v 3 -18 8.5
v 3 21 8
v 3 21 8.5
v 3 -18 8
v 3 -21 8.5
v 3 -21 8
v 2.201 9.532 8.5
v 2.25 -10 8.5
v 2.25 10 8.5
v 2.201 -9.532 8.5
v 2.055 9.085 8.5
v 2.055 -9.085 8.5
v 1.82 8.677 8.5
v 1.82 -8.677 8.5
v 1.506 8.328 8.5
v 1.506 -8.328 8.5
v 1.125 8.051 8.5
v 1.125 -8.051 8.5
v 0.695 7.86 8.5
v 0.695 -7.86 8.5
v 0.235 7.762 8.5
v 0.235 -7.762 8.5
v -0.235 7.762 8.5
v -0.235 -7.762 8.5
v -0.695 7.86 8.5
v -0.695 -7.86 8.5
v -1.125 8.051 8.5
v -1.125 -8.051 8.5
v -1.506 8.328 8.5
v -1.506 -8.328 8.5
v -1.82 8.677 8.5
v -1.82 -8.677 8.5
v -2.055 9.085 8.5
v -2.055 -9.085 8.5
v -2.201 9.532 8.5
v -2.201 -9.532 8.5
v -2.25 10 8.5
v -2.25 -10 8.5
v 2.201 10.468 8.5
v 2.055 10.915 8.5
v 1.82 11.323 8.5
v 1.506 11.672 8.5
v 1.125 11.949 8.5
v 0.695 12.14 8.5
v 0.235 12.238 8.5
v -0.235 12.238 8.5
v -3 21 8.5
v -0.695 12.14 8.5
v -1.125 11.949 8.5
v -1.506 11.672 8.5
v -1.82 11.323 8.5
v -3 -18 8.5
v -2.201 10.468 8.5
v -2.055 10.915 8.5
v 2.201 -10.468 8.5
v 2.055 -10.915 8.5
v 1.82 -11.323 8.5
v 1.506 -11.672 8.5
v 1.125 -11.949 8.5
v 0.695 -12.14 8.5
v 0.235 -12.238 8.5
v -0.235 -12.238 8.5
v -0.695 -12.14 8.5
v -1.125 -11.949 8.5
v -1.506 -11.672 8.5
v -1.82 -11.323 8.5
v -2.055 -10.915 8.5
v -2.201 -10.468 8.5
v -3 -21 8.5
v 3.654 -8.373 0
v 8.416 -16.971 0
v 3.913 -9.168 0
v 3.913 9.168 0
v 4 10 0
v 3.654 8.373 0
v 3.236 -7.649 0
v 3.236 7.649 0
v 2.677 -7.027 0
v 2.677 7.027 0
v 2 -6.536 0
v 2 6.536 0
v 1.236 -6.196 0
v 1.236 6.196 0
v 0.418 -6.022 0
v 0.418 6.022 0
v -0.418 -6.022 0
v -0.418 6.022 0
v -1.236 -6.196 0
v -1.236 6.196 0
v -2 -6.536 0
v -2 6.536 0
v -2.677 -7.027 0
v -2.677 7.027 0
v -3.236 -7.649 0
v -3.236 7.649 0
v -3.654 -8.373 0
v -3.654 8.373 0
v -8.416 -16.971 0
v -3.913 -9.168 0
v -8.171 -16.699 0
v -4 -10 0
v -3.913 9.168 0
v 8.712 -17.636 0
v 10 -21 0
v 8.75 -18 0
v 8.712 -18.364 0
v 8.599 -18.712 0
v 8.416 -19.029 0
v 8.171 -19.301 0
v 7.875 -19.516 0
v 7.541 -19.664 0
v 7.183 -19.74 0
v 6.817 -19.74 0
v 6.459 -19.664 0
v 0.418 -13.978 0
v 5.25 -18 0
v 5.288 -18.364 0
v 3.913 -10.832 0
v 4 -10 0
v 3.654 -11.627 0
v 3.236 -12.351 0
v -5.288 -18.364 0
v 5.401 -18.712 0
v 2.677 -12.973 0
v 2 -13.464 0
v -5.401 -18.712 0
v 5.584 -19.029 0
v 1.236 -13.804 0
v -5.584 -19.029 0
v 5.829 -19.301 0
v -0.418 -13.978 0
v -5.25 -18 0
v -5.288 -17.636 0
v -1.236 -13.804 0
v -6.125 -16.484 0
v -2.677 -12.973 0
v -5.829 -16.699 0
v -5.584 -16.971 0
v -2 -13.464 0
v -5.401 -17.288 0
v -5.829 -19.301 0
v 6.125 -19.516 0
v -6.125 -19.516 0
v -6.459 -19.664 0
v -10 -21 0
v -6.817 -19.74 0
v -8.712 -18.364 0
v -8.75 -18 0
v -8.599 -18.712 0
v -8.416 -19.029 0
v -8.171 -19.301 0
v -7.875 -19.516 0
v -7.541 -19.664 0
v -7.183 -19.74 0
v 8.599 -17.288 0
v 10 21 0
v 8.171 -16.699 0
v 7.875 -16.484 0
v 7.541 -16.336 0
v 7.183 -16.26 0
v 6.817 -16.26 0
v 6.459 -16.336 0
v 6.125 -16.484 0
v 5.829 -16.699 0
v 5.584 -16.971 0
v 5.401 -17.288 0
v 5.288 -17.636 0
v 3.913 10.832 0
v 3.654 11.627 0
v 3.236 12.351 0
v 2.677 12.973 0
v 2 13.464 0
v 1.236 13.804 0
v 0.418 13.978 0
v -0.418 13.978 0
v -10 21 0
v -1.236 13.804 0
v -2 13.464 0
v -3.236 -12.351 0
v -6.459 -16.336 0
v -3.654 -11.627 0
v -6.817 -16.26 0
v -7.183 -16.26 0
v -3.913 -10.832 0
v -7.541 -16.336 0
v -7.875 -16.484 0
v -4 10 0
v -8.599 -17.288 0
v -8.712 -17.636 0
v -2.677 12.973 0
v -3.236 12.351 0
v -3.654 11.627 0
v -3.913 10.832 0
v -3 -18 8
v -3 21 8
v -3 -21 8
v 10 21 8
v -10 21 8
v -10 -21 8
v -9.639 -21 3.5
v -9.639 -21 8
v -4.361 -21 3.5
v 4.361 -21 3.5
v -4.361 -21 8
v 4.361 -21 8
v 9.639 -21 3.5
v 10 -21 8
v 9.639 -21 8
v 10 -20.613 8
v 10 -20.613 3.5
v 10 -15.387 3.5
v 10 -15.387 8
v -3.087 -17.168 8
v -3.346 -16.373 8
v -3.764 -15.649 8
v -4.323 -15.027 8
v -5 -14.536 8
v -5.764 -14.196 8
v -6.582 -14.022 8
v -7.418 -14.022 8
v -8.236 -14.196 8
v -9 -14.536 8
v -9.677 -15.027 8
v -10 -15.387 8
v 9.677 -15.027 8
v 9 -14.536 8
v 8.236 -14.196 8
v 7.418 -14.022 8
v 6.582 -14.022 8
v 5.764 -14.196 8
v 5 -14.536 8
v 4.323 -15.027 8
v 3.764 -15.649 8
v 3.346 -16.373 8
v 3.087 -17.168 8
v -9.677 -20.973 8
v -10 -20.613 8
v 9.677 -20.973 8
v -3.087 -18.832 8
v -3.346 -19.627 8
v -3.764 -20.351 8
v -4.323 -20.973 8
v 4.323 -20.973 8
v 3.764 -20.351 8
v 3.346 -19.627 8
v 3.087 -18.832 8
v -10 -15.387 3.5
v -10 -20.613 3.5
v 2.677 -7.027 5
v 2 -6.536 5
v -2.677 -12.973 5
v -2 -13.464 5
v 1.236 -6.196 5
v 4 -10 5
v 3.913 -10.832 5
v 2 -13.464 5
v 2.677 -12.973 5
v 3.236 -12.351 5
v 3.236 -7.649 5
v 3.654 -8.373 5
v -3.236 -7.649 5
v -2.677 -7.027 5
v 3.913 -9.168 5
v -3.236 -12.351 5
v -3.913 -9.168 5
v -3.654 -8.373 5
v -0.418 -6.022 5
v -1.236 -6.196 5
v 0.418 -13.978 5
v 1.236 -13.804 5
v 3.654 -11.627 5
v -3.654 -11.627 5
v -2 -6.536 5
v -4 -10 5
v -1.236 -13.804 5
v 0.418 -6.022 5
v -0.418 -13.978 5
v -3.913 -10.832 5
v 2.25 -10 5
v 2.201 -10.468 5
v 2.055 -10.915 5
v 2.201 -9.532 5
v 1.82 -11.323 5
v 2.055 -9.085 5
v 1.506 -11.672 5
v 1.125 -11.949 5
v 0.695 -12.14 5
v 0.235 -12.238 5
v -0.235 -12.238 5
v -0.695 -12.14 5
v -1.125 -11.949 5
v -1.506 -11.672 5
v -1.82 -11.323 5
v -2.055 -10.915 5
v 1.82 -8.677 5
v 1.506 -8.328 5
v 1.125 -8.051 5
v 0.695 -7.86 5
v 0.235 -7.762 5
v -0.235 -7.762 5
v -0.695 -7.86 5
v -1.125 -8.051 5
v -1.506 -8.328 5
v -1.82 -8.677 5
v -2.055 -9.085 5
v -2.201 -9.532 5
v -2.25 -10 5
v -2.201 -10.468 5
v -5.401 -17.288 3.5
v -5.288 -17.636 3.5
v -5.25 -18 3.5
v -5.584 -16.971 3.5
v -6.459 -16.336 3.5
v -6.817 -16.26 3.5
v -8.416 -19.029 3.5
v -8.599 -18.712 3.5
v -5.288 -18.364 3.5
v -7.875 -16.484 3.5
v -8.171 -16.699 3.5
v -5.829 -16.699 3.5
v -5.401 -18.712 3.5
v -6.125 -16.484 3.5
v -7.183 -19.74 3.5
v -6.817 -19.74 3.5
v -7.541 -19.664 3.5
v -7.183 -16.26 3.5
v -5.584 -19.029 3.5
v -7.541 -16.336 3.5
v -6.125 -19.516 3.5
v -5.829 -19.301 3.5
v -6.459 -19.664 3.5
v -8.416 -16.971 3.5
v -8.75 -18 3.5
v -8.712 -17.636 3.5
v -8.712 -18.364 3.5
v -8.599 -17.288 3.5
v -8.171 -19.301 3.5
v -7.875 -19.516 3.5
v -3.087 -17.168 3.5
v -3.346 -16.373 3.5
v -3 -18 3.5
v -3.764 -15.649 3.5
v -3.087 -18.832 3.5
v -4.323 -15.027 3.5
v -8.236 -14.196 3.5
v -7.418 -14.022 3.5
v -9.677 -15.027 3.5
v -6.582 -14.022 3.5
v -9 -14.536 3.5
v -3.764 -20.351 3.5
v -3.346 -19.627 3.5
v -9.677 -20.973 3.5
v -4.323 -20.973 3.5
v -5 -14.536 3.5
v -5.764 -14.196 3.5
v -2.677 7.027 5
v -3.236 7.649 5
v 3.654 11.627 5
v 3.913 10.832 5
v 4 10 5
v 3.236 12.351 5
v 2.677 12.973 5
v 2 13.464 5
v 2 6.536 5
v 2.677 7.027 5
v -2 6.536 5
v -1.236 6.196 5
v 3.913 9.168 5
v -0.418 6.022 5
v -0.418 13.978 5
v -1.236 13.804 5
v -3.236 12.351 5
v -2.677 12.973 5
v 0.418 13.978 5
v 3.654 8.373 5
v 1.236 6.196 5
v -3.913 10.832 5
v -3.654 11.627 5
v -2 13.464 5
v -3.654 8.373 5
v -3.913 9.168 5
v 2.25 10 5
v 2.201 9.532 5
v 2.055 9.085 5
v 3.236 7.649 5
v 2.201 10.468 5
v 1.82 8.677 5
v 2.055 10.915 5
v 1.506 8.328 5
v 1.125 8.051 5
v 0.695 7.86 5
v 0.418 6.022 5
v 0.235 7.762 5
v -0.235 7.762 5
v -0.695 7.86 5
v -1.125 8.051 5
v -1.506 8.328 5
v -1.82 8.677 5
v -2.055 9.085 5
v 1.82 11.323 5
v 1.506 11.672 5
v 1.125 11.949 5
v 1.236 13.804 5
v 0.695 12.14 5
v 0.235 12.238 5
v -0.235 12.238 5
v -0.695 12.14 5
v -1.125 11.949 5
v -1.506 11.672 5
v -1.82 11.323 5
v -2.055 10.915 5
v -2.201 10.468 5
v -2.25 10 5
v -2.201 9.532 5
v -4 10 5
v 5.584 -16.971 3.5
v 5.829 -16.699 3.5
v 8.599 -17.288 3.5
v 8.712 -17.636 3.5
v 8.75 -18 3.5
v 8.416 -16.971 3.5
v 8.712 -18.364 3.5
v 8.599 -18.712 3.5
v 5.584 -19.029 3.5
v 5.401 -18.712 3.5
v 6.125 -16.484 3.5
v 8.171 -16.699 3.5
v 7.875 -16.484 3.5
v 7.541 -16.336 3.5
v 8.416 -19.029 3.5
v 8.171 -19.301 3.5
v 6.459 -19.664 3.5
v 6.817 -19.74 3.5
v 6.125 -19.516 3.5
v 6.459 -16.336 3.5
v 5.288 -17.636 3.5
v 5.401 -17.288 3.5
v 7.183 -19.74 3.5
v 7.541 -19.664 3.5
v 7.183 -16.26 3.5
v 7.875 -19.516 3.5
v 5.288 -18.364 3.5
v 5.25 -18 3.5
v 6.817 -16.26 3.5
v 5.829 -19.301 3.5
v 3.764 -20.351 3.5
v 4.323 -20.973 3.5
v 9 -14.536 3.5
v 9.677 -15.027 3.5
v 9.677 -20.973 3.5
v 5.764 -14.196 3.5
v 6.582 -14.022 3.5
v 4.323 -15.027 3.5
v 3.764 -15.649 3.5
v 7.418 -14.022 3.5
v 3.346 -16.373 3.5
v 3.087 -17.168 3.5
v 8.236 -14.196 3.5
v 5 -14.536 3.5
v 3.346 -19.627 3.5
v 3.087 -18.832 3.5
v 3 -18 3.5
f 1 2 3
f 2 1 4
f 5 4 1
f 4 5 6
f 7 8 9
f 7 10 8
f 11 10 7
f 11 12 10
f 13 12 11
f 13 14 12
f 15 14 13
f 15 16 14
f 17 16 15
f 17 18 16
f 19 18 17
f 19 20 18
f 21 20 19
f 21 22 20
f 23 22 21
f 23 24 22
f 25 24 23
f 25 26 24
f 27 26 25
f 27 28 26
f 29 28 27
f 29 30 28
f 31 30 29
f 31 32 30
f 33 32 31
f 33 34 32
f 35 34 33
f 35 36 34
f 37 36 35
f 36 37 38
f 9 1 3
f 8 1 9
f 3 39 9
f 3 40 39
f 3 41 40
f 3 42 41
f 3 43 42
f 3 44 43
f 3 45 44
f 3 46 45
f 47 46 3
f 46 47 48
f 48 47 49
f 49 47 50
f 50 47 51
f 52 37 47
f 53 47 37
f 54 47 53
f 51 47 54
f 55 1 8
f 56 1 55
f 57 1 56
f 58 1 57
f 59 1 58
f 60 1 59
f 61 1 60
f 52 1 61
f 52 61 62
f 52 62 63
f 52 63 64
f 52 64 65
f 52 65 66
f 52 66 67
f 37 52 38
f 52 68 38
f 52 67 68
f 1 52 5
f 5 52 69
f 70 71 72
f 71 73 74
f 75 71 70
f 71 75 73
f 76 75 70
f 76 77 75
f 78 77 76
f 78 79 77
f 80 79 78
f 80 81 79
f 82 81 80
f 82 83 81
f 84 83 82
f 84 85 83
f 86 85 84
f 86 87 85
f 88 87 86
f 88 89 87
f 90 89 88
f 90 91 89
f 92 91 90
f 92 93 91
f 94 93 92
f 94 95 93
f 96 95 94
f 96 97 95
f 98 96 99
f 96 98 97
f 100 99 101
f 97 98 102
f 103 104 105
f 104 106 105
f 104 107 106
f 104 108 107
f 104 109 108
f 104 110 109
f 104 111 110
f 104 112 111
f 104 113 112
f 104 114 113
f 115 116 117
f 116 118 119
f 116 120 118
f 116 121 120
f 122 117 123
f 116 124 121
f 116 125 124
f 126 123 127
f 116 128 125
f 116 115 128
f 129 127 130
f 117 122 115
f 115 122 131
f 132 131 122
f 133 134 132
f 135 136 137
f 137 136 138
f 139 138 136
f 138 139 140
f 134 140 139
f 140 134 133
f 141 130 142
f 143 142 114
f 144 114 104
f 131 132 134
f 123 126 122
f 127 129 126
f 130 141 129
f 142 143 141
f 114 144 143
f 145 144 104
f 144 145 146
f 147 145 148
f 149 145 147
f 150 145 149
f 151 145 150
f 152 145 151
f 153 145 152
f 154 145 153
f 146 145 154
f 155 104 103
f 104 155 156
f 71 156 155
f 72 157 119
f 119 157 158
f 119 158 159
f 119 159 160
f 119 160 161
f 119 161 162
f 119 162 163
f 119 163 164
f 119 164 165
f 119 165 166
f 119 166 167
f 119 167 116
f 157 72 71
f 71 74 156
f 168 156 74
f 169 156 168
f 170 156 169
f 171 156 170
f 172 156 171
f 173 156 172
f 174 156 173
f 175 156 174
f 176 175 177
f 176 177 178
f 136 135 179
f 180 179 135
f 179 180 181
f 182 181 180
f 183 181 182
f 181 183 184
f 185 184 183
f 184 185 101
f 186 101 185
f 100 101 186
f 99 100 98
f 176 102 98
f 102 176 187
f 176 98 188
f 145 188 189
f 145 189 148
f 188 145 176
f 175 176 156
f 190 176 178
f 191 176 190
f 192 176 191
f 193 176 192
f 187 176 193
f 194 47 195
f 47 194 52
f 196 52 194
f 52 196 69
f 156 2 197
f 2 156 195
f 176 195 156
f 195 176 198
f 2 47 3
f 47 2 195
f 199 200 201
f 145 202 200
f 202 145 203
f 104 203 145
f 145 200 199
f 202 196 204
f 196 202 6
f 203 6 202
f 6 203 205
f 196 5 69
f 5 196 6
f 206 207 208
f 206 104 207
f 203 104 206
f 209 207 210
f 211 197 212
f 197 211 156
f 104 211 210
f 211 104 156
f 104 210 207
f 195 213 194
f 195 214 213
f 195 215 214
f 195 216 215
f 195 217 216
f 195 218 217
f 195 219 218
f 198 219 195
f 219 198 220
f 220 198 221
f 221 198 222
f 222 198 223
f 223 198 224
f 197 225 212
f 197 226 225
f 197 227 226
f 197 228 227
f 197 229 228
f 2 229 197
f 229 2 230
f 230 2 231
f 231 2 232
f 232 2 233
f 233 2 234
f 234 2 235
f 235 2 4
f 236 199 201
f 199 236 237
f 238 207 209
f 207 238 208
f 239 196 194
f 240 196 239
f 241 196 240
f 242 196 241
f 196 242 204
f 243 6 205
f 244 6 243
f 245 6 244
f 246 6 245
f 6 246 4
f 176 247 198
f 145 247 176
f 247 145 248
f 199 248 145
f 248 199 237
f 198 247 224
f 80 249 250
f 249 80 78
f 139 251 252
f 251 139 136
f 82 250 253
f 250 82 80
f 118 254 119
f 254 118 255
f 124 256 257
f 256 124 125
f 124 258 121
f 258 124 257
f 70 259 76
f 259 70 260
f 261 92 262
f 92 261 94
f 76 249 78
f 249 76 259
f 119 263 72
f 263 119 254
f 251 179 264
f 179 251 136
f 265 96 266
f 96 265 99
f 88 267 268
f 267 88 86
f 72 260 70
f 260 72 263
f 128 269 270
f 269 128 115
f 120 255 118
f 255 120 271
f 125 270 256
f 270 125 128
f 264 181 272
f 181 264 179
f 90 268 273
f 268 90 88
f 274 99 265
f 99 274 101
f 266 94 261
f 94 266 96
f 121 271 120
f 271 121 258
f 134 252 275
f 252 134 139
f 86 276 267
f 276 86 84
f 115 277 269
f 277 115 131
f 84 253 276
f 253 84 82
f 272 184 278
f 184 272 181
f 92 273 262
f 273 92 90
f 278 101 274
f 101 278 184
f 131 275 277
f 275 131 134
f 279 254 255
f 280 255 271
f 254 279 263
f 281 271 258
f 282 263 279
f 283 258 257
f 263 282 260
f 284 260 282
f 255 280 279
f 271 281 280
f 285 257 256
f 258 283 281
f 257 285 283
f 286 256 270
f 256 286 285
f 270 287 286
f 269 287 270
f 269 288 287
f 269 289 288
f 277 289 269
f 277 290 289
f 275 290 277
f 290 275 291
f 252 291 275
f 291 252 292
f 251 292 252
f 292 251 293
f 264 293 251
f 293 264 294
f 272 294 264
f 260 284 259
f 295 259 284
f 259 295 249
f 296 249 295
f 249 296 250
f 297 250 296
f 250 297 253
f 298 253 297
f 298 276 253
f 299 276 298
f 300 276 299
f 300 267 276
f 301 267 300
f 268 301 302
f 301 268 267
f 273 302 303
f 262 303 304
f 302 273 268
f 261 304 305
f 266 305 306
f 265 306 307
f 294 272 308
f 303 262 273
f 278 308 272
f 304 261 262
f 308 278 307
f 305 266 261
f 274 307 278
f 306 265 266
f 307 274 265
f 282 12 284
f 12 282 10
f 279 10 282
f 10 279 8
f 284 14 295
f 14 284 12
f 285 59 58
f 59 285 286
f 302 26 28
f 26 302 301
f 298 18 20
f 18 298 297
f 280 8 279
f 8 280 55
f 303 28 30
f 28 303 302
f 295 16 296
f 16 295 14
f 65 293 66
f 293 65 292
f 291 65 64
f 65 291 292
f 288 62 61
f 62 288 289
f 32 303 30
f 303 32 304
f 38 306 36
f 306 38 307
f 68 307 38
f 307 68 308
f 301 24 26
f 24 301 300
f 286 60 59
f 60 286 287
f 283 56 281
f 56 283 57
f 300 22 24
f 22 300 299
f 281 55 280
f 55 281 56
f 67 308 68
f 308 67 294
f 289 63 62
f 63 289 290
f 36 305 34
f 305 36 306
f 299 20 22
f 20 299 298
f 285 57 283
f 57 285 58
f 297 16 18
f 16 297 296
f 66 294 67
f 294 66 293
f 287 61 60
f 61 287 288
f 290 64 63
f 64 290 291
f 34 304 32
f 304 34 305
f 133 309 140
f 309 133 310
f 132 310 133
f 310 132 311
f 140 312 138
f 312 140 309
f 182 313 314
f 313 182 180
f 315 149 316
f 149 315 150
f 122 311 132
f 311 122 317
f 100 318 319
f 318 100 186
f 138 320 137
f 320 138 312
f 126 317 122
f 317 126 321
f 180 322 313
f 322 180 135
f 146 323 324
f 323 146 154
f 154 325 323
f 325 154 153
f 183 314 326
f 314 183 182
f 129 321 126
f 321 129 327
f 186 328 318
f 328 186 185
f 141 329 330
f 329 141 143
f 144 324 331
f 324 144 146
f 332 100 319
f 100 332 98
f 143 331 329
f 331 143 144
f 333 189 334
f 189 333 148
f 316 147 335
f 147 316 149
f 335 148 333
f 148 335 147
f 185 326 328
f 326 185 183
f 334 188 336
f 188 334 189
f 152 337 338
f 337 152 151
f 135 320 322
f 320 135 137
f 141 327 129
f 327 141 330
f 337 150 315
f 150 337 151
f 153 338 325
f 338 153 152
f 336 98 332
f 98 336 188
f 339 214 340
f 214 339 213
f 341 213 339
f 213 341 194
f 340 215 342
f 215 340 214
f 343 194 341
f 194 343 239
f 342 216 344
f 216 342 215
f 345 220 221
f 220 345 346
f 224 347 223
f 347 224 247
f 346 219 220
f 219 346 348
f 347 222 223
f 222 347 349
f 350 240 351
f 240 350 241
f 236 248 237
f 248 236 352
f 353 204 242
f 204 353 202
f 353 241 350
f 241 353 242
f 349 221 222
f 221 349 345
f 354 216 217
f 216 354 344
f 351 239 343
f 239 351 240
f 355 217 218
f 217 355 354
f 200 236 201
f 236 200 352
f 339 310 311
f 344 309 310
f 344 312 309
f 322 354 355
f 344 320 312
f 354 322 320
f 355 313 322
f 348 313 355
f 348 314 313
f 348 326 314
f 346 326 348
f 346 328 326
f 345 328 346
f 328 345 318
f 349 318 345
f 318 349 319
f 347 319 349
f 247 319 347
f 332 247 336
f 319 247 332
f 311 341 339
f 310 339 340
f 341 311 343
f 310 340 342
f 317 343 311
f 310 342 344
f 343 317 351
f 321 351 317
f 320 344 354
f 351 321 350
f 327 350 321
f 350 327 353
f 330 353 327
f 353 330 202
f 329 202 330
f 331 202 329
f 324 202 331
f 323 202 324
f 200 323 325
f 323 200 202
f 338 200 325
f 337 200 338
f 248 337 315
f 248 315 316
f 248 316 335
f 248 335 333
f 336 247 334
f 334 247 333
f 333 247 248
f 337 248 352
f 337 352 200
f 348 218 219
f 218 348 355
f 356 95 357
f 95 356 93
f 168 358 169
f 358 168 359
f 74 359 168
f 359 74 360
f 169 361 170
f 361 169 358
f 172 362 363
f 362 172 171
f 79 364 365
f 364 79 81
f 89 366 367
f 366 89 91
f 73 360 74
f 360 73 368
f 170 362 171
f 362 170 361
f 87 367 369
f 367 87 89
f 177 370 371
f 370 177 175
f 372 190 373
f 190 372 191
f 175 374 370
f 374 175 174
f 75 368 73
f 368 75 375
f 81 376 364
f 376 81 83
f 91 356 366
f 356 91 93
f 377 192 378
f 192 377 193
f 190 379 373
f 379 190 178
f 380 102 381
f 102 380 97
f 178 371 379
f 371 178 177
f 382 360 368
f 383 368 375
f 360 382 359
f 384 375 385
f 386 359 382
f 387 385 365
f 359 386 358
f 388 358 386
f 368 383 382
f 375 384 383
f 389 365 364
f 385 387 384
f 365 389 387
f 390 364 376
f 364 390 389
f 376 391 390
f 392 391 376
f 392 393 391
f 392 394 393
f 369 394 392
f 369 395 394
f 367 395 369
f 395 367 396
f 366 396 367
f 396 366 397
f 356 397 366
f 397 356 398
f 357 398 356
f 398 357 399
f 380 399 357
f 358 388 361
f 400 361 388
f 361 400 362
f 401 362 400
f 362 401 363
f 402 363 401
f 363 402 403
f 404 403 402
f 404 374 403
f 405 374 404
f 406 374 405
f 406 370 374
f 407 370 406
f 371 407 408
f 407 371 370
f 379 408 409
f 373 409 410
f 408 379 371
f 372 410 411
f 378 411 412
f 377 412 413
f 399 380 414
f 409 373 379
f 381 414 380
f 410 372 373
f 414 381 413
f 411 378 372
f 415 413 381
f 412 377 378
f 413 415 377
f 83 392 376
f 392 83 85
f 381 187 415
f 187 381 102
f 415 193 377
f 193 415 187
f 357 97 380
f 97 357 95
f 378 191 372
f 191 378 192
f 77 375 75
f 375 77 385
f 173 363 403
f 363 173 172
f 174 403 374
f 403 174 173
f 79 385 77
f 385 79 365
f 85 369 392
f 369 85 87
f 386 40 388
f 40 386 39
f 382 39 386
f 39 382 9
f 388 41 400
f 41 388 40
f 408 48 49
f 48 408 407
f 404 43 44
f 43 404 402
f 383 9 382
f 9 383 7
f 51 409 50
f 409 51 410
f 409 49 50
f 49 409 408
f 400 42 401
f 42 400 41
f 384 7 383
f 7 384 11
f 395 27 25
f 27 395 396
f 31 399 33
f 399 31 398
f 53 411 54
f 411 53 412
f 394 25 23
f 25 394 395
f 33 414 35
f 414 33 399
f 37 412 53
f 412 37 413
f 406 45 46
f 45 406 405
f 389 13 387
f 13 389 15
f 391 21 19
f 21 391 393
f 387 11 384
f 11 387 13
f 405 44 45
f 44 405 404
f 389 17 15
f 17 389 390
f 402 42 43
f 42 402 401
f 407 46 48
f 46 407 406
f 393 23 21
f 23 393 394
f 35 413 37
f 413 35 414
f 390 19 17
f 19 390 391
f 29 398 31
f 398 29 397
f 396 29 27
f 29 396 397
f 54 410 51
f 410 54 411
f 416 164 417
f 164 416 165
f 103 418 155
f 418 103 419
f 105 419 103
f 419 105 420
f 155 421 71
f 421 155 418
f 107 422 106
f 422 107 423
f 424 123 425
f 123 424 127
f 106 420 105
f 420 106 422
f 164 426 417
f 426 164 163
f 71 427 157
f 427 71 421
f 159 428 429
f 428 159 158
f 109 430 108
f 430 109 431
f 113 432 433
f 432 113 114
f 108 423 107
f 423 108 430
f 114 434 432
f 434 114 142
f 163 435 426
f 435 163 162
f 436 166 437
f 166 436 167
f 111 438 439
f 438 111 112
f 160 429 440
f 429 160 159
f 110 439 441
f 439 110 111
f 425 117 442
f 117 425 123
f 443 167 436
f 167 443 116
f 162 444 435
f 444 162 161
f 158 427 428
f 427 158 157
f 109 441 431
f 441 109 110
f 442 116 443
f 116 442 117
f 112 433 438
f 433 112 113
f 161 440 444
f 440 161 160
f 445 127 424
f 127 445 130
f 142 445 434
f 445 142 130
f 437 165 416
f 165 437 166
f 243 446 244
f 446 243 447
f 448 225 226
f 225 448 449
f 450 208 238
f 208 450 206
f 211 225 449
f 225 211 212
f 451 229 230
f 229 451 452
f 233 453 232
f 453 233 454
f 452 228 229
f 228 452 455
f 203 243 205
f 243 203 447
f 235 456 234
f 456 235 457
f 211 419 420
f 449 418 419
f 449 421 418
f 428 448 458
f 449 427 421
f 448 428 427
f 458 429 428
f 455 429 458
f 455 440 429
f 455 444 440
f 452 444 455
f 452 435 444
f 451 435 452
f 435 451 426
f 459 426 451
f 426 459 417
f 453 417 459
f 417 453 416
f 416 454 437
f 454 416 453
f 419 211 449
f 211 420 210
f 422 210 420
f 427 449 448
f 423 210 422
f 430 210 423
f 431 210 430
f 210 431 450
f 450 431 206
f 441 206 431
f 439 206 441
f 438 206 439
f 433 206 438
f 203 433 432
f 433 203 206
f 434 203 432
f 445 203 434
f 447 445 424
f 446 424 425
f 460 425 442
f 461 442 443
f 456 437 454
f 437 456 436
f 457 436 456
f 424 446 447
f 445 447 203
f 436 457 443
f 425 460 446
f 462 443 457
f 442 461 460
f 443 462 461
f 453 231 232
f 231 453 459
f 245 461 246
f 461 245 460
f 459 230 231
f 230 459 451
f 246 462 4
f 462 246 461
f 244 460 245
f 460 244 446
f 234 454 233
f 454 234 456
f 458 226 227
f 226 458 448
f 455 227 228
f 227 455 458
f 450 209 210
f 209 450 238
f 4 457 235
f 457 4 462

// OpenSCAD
WIDTH = 20;
LENGTH = 42;
HEIGHT = 8;

GROOVE_WIDTH = 6;
GROOVE_HEIGHT = 0.5;

MOUNT_HOLE_DIA = 4.5;
MOUNT_HOLE_HEAD_DIA = 8;
MOUNT_HOLE_HEAD_HEIGHT = 5;
MOUNT_HOLE_SPACING = 20;

TENSIONER_HOLE_DIA = 3.5;
TENSIONER_HOLE_HEAD_DIA = 8;
TENSIONER_HOLE_HEAD_HEIGHT = 5;
TENSIONER_HOLE_SPACING = 14;
TENSIONER_HOLE_OFFSET = 3;

$fn = 30;

difference() {
  union() {
    translate([-GROOVE_WIDTH/2, -LENGTH/2, 0])
    cube(size = [GROOVE_WIDTH, LENGTH, GROOVE_HEIGHT + HEIGHT]);
    translate([-WIDTH/2, -LENGTH/2, 0])
    cube(size = [WIDTH, LENGTH, HEIGHT]);
  }

  #for(i = [-1, 1]) {
    translate([0, i * MOUNT_HOLE_SPACING/2, 0]) {
      cylinder(d = MOUNT_HOLE_HEAD_DIA, h = MOUNT_HOLE_HEAD_HEIGHT);
      cylinder(d = MOUNT_HOLE_DIA, h = HEIGHT + GROOVE_HEIGHT);
    }

    translate([i * TENSIONER_HOLE_SPACING/2, -LENGTH/2 + TENSIONER_HOLE_OFFSET, 0]) {
      cylinder(d = TENSIONER_HOLE_DIA, h = HEIGHT);
      translate([0, 0, GROOVE_HEIGHT + HEIGHT - TENSIONER_HOLE_HEAD_HEIGHT])
      cylinder(d = TENSIONER_HOLE_HEAD_DIA, h = TENSIONER_HOLE_HEAD_HEIGHT);
    }
  }
}
